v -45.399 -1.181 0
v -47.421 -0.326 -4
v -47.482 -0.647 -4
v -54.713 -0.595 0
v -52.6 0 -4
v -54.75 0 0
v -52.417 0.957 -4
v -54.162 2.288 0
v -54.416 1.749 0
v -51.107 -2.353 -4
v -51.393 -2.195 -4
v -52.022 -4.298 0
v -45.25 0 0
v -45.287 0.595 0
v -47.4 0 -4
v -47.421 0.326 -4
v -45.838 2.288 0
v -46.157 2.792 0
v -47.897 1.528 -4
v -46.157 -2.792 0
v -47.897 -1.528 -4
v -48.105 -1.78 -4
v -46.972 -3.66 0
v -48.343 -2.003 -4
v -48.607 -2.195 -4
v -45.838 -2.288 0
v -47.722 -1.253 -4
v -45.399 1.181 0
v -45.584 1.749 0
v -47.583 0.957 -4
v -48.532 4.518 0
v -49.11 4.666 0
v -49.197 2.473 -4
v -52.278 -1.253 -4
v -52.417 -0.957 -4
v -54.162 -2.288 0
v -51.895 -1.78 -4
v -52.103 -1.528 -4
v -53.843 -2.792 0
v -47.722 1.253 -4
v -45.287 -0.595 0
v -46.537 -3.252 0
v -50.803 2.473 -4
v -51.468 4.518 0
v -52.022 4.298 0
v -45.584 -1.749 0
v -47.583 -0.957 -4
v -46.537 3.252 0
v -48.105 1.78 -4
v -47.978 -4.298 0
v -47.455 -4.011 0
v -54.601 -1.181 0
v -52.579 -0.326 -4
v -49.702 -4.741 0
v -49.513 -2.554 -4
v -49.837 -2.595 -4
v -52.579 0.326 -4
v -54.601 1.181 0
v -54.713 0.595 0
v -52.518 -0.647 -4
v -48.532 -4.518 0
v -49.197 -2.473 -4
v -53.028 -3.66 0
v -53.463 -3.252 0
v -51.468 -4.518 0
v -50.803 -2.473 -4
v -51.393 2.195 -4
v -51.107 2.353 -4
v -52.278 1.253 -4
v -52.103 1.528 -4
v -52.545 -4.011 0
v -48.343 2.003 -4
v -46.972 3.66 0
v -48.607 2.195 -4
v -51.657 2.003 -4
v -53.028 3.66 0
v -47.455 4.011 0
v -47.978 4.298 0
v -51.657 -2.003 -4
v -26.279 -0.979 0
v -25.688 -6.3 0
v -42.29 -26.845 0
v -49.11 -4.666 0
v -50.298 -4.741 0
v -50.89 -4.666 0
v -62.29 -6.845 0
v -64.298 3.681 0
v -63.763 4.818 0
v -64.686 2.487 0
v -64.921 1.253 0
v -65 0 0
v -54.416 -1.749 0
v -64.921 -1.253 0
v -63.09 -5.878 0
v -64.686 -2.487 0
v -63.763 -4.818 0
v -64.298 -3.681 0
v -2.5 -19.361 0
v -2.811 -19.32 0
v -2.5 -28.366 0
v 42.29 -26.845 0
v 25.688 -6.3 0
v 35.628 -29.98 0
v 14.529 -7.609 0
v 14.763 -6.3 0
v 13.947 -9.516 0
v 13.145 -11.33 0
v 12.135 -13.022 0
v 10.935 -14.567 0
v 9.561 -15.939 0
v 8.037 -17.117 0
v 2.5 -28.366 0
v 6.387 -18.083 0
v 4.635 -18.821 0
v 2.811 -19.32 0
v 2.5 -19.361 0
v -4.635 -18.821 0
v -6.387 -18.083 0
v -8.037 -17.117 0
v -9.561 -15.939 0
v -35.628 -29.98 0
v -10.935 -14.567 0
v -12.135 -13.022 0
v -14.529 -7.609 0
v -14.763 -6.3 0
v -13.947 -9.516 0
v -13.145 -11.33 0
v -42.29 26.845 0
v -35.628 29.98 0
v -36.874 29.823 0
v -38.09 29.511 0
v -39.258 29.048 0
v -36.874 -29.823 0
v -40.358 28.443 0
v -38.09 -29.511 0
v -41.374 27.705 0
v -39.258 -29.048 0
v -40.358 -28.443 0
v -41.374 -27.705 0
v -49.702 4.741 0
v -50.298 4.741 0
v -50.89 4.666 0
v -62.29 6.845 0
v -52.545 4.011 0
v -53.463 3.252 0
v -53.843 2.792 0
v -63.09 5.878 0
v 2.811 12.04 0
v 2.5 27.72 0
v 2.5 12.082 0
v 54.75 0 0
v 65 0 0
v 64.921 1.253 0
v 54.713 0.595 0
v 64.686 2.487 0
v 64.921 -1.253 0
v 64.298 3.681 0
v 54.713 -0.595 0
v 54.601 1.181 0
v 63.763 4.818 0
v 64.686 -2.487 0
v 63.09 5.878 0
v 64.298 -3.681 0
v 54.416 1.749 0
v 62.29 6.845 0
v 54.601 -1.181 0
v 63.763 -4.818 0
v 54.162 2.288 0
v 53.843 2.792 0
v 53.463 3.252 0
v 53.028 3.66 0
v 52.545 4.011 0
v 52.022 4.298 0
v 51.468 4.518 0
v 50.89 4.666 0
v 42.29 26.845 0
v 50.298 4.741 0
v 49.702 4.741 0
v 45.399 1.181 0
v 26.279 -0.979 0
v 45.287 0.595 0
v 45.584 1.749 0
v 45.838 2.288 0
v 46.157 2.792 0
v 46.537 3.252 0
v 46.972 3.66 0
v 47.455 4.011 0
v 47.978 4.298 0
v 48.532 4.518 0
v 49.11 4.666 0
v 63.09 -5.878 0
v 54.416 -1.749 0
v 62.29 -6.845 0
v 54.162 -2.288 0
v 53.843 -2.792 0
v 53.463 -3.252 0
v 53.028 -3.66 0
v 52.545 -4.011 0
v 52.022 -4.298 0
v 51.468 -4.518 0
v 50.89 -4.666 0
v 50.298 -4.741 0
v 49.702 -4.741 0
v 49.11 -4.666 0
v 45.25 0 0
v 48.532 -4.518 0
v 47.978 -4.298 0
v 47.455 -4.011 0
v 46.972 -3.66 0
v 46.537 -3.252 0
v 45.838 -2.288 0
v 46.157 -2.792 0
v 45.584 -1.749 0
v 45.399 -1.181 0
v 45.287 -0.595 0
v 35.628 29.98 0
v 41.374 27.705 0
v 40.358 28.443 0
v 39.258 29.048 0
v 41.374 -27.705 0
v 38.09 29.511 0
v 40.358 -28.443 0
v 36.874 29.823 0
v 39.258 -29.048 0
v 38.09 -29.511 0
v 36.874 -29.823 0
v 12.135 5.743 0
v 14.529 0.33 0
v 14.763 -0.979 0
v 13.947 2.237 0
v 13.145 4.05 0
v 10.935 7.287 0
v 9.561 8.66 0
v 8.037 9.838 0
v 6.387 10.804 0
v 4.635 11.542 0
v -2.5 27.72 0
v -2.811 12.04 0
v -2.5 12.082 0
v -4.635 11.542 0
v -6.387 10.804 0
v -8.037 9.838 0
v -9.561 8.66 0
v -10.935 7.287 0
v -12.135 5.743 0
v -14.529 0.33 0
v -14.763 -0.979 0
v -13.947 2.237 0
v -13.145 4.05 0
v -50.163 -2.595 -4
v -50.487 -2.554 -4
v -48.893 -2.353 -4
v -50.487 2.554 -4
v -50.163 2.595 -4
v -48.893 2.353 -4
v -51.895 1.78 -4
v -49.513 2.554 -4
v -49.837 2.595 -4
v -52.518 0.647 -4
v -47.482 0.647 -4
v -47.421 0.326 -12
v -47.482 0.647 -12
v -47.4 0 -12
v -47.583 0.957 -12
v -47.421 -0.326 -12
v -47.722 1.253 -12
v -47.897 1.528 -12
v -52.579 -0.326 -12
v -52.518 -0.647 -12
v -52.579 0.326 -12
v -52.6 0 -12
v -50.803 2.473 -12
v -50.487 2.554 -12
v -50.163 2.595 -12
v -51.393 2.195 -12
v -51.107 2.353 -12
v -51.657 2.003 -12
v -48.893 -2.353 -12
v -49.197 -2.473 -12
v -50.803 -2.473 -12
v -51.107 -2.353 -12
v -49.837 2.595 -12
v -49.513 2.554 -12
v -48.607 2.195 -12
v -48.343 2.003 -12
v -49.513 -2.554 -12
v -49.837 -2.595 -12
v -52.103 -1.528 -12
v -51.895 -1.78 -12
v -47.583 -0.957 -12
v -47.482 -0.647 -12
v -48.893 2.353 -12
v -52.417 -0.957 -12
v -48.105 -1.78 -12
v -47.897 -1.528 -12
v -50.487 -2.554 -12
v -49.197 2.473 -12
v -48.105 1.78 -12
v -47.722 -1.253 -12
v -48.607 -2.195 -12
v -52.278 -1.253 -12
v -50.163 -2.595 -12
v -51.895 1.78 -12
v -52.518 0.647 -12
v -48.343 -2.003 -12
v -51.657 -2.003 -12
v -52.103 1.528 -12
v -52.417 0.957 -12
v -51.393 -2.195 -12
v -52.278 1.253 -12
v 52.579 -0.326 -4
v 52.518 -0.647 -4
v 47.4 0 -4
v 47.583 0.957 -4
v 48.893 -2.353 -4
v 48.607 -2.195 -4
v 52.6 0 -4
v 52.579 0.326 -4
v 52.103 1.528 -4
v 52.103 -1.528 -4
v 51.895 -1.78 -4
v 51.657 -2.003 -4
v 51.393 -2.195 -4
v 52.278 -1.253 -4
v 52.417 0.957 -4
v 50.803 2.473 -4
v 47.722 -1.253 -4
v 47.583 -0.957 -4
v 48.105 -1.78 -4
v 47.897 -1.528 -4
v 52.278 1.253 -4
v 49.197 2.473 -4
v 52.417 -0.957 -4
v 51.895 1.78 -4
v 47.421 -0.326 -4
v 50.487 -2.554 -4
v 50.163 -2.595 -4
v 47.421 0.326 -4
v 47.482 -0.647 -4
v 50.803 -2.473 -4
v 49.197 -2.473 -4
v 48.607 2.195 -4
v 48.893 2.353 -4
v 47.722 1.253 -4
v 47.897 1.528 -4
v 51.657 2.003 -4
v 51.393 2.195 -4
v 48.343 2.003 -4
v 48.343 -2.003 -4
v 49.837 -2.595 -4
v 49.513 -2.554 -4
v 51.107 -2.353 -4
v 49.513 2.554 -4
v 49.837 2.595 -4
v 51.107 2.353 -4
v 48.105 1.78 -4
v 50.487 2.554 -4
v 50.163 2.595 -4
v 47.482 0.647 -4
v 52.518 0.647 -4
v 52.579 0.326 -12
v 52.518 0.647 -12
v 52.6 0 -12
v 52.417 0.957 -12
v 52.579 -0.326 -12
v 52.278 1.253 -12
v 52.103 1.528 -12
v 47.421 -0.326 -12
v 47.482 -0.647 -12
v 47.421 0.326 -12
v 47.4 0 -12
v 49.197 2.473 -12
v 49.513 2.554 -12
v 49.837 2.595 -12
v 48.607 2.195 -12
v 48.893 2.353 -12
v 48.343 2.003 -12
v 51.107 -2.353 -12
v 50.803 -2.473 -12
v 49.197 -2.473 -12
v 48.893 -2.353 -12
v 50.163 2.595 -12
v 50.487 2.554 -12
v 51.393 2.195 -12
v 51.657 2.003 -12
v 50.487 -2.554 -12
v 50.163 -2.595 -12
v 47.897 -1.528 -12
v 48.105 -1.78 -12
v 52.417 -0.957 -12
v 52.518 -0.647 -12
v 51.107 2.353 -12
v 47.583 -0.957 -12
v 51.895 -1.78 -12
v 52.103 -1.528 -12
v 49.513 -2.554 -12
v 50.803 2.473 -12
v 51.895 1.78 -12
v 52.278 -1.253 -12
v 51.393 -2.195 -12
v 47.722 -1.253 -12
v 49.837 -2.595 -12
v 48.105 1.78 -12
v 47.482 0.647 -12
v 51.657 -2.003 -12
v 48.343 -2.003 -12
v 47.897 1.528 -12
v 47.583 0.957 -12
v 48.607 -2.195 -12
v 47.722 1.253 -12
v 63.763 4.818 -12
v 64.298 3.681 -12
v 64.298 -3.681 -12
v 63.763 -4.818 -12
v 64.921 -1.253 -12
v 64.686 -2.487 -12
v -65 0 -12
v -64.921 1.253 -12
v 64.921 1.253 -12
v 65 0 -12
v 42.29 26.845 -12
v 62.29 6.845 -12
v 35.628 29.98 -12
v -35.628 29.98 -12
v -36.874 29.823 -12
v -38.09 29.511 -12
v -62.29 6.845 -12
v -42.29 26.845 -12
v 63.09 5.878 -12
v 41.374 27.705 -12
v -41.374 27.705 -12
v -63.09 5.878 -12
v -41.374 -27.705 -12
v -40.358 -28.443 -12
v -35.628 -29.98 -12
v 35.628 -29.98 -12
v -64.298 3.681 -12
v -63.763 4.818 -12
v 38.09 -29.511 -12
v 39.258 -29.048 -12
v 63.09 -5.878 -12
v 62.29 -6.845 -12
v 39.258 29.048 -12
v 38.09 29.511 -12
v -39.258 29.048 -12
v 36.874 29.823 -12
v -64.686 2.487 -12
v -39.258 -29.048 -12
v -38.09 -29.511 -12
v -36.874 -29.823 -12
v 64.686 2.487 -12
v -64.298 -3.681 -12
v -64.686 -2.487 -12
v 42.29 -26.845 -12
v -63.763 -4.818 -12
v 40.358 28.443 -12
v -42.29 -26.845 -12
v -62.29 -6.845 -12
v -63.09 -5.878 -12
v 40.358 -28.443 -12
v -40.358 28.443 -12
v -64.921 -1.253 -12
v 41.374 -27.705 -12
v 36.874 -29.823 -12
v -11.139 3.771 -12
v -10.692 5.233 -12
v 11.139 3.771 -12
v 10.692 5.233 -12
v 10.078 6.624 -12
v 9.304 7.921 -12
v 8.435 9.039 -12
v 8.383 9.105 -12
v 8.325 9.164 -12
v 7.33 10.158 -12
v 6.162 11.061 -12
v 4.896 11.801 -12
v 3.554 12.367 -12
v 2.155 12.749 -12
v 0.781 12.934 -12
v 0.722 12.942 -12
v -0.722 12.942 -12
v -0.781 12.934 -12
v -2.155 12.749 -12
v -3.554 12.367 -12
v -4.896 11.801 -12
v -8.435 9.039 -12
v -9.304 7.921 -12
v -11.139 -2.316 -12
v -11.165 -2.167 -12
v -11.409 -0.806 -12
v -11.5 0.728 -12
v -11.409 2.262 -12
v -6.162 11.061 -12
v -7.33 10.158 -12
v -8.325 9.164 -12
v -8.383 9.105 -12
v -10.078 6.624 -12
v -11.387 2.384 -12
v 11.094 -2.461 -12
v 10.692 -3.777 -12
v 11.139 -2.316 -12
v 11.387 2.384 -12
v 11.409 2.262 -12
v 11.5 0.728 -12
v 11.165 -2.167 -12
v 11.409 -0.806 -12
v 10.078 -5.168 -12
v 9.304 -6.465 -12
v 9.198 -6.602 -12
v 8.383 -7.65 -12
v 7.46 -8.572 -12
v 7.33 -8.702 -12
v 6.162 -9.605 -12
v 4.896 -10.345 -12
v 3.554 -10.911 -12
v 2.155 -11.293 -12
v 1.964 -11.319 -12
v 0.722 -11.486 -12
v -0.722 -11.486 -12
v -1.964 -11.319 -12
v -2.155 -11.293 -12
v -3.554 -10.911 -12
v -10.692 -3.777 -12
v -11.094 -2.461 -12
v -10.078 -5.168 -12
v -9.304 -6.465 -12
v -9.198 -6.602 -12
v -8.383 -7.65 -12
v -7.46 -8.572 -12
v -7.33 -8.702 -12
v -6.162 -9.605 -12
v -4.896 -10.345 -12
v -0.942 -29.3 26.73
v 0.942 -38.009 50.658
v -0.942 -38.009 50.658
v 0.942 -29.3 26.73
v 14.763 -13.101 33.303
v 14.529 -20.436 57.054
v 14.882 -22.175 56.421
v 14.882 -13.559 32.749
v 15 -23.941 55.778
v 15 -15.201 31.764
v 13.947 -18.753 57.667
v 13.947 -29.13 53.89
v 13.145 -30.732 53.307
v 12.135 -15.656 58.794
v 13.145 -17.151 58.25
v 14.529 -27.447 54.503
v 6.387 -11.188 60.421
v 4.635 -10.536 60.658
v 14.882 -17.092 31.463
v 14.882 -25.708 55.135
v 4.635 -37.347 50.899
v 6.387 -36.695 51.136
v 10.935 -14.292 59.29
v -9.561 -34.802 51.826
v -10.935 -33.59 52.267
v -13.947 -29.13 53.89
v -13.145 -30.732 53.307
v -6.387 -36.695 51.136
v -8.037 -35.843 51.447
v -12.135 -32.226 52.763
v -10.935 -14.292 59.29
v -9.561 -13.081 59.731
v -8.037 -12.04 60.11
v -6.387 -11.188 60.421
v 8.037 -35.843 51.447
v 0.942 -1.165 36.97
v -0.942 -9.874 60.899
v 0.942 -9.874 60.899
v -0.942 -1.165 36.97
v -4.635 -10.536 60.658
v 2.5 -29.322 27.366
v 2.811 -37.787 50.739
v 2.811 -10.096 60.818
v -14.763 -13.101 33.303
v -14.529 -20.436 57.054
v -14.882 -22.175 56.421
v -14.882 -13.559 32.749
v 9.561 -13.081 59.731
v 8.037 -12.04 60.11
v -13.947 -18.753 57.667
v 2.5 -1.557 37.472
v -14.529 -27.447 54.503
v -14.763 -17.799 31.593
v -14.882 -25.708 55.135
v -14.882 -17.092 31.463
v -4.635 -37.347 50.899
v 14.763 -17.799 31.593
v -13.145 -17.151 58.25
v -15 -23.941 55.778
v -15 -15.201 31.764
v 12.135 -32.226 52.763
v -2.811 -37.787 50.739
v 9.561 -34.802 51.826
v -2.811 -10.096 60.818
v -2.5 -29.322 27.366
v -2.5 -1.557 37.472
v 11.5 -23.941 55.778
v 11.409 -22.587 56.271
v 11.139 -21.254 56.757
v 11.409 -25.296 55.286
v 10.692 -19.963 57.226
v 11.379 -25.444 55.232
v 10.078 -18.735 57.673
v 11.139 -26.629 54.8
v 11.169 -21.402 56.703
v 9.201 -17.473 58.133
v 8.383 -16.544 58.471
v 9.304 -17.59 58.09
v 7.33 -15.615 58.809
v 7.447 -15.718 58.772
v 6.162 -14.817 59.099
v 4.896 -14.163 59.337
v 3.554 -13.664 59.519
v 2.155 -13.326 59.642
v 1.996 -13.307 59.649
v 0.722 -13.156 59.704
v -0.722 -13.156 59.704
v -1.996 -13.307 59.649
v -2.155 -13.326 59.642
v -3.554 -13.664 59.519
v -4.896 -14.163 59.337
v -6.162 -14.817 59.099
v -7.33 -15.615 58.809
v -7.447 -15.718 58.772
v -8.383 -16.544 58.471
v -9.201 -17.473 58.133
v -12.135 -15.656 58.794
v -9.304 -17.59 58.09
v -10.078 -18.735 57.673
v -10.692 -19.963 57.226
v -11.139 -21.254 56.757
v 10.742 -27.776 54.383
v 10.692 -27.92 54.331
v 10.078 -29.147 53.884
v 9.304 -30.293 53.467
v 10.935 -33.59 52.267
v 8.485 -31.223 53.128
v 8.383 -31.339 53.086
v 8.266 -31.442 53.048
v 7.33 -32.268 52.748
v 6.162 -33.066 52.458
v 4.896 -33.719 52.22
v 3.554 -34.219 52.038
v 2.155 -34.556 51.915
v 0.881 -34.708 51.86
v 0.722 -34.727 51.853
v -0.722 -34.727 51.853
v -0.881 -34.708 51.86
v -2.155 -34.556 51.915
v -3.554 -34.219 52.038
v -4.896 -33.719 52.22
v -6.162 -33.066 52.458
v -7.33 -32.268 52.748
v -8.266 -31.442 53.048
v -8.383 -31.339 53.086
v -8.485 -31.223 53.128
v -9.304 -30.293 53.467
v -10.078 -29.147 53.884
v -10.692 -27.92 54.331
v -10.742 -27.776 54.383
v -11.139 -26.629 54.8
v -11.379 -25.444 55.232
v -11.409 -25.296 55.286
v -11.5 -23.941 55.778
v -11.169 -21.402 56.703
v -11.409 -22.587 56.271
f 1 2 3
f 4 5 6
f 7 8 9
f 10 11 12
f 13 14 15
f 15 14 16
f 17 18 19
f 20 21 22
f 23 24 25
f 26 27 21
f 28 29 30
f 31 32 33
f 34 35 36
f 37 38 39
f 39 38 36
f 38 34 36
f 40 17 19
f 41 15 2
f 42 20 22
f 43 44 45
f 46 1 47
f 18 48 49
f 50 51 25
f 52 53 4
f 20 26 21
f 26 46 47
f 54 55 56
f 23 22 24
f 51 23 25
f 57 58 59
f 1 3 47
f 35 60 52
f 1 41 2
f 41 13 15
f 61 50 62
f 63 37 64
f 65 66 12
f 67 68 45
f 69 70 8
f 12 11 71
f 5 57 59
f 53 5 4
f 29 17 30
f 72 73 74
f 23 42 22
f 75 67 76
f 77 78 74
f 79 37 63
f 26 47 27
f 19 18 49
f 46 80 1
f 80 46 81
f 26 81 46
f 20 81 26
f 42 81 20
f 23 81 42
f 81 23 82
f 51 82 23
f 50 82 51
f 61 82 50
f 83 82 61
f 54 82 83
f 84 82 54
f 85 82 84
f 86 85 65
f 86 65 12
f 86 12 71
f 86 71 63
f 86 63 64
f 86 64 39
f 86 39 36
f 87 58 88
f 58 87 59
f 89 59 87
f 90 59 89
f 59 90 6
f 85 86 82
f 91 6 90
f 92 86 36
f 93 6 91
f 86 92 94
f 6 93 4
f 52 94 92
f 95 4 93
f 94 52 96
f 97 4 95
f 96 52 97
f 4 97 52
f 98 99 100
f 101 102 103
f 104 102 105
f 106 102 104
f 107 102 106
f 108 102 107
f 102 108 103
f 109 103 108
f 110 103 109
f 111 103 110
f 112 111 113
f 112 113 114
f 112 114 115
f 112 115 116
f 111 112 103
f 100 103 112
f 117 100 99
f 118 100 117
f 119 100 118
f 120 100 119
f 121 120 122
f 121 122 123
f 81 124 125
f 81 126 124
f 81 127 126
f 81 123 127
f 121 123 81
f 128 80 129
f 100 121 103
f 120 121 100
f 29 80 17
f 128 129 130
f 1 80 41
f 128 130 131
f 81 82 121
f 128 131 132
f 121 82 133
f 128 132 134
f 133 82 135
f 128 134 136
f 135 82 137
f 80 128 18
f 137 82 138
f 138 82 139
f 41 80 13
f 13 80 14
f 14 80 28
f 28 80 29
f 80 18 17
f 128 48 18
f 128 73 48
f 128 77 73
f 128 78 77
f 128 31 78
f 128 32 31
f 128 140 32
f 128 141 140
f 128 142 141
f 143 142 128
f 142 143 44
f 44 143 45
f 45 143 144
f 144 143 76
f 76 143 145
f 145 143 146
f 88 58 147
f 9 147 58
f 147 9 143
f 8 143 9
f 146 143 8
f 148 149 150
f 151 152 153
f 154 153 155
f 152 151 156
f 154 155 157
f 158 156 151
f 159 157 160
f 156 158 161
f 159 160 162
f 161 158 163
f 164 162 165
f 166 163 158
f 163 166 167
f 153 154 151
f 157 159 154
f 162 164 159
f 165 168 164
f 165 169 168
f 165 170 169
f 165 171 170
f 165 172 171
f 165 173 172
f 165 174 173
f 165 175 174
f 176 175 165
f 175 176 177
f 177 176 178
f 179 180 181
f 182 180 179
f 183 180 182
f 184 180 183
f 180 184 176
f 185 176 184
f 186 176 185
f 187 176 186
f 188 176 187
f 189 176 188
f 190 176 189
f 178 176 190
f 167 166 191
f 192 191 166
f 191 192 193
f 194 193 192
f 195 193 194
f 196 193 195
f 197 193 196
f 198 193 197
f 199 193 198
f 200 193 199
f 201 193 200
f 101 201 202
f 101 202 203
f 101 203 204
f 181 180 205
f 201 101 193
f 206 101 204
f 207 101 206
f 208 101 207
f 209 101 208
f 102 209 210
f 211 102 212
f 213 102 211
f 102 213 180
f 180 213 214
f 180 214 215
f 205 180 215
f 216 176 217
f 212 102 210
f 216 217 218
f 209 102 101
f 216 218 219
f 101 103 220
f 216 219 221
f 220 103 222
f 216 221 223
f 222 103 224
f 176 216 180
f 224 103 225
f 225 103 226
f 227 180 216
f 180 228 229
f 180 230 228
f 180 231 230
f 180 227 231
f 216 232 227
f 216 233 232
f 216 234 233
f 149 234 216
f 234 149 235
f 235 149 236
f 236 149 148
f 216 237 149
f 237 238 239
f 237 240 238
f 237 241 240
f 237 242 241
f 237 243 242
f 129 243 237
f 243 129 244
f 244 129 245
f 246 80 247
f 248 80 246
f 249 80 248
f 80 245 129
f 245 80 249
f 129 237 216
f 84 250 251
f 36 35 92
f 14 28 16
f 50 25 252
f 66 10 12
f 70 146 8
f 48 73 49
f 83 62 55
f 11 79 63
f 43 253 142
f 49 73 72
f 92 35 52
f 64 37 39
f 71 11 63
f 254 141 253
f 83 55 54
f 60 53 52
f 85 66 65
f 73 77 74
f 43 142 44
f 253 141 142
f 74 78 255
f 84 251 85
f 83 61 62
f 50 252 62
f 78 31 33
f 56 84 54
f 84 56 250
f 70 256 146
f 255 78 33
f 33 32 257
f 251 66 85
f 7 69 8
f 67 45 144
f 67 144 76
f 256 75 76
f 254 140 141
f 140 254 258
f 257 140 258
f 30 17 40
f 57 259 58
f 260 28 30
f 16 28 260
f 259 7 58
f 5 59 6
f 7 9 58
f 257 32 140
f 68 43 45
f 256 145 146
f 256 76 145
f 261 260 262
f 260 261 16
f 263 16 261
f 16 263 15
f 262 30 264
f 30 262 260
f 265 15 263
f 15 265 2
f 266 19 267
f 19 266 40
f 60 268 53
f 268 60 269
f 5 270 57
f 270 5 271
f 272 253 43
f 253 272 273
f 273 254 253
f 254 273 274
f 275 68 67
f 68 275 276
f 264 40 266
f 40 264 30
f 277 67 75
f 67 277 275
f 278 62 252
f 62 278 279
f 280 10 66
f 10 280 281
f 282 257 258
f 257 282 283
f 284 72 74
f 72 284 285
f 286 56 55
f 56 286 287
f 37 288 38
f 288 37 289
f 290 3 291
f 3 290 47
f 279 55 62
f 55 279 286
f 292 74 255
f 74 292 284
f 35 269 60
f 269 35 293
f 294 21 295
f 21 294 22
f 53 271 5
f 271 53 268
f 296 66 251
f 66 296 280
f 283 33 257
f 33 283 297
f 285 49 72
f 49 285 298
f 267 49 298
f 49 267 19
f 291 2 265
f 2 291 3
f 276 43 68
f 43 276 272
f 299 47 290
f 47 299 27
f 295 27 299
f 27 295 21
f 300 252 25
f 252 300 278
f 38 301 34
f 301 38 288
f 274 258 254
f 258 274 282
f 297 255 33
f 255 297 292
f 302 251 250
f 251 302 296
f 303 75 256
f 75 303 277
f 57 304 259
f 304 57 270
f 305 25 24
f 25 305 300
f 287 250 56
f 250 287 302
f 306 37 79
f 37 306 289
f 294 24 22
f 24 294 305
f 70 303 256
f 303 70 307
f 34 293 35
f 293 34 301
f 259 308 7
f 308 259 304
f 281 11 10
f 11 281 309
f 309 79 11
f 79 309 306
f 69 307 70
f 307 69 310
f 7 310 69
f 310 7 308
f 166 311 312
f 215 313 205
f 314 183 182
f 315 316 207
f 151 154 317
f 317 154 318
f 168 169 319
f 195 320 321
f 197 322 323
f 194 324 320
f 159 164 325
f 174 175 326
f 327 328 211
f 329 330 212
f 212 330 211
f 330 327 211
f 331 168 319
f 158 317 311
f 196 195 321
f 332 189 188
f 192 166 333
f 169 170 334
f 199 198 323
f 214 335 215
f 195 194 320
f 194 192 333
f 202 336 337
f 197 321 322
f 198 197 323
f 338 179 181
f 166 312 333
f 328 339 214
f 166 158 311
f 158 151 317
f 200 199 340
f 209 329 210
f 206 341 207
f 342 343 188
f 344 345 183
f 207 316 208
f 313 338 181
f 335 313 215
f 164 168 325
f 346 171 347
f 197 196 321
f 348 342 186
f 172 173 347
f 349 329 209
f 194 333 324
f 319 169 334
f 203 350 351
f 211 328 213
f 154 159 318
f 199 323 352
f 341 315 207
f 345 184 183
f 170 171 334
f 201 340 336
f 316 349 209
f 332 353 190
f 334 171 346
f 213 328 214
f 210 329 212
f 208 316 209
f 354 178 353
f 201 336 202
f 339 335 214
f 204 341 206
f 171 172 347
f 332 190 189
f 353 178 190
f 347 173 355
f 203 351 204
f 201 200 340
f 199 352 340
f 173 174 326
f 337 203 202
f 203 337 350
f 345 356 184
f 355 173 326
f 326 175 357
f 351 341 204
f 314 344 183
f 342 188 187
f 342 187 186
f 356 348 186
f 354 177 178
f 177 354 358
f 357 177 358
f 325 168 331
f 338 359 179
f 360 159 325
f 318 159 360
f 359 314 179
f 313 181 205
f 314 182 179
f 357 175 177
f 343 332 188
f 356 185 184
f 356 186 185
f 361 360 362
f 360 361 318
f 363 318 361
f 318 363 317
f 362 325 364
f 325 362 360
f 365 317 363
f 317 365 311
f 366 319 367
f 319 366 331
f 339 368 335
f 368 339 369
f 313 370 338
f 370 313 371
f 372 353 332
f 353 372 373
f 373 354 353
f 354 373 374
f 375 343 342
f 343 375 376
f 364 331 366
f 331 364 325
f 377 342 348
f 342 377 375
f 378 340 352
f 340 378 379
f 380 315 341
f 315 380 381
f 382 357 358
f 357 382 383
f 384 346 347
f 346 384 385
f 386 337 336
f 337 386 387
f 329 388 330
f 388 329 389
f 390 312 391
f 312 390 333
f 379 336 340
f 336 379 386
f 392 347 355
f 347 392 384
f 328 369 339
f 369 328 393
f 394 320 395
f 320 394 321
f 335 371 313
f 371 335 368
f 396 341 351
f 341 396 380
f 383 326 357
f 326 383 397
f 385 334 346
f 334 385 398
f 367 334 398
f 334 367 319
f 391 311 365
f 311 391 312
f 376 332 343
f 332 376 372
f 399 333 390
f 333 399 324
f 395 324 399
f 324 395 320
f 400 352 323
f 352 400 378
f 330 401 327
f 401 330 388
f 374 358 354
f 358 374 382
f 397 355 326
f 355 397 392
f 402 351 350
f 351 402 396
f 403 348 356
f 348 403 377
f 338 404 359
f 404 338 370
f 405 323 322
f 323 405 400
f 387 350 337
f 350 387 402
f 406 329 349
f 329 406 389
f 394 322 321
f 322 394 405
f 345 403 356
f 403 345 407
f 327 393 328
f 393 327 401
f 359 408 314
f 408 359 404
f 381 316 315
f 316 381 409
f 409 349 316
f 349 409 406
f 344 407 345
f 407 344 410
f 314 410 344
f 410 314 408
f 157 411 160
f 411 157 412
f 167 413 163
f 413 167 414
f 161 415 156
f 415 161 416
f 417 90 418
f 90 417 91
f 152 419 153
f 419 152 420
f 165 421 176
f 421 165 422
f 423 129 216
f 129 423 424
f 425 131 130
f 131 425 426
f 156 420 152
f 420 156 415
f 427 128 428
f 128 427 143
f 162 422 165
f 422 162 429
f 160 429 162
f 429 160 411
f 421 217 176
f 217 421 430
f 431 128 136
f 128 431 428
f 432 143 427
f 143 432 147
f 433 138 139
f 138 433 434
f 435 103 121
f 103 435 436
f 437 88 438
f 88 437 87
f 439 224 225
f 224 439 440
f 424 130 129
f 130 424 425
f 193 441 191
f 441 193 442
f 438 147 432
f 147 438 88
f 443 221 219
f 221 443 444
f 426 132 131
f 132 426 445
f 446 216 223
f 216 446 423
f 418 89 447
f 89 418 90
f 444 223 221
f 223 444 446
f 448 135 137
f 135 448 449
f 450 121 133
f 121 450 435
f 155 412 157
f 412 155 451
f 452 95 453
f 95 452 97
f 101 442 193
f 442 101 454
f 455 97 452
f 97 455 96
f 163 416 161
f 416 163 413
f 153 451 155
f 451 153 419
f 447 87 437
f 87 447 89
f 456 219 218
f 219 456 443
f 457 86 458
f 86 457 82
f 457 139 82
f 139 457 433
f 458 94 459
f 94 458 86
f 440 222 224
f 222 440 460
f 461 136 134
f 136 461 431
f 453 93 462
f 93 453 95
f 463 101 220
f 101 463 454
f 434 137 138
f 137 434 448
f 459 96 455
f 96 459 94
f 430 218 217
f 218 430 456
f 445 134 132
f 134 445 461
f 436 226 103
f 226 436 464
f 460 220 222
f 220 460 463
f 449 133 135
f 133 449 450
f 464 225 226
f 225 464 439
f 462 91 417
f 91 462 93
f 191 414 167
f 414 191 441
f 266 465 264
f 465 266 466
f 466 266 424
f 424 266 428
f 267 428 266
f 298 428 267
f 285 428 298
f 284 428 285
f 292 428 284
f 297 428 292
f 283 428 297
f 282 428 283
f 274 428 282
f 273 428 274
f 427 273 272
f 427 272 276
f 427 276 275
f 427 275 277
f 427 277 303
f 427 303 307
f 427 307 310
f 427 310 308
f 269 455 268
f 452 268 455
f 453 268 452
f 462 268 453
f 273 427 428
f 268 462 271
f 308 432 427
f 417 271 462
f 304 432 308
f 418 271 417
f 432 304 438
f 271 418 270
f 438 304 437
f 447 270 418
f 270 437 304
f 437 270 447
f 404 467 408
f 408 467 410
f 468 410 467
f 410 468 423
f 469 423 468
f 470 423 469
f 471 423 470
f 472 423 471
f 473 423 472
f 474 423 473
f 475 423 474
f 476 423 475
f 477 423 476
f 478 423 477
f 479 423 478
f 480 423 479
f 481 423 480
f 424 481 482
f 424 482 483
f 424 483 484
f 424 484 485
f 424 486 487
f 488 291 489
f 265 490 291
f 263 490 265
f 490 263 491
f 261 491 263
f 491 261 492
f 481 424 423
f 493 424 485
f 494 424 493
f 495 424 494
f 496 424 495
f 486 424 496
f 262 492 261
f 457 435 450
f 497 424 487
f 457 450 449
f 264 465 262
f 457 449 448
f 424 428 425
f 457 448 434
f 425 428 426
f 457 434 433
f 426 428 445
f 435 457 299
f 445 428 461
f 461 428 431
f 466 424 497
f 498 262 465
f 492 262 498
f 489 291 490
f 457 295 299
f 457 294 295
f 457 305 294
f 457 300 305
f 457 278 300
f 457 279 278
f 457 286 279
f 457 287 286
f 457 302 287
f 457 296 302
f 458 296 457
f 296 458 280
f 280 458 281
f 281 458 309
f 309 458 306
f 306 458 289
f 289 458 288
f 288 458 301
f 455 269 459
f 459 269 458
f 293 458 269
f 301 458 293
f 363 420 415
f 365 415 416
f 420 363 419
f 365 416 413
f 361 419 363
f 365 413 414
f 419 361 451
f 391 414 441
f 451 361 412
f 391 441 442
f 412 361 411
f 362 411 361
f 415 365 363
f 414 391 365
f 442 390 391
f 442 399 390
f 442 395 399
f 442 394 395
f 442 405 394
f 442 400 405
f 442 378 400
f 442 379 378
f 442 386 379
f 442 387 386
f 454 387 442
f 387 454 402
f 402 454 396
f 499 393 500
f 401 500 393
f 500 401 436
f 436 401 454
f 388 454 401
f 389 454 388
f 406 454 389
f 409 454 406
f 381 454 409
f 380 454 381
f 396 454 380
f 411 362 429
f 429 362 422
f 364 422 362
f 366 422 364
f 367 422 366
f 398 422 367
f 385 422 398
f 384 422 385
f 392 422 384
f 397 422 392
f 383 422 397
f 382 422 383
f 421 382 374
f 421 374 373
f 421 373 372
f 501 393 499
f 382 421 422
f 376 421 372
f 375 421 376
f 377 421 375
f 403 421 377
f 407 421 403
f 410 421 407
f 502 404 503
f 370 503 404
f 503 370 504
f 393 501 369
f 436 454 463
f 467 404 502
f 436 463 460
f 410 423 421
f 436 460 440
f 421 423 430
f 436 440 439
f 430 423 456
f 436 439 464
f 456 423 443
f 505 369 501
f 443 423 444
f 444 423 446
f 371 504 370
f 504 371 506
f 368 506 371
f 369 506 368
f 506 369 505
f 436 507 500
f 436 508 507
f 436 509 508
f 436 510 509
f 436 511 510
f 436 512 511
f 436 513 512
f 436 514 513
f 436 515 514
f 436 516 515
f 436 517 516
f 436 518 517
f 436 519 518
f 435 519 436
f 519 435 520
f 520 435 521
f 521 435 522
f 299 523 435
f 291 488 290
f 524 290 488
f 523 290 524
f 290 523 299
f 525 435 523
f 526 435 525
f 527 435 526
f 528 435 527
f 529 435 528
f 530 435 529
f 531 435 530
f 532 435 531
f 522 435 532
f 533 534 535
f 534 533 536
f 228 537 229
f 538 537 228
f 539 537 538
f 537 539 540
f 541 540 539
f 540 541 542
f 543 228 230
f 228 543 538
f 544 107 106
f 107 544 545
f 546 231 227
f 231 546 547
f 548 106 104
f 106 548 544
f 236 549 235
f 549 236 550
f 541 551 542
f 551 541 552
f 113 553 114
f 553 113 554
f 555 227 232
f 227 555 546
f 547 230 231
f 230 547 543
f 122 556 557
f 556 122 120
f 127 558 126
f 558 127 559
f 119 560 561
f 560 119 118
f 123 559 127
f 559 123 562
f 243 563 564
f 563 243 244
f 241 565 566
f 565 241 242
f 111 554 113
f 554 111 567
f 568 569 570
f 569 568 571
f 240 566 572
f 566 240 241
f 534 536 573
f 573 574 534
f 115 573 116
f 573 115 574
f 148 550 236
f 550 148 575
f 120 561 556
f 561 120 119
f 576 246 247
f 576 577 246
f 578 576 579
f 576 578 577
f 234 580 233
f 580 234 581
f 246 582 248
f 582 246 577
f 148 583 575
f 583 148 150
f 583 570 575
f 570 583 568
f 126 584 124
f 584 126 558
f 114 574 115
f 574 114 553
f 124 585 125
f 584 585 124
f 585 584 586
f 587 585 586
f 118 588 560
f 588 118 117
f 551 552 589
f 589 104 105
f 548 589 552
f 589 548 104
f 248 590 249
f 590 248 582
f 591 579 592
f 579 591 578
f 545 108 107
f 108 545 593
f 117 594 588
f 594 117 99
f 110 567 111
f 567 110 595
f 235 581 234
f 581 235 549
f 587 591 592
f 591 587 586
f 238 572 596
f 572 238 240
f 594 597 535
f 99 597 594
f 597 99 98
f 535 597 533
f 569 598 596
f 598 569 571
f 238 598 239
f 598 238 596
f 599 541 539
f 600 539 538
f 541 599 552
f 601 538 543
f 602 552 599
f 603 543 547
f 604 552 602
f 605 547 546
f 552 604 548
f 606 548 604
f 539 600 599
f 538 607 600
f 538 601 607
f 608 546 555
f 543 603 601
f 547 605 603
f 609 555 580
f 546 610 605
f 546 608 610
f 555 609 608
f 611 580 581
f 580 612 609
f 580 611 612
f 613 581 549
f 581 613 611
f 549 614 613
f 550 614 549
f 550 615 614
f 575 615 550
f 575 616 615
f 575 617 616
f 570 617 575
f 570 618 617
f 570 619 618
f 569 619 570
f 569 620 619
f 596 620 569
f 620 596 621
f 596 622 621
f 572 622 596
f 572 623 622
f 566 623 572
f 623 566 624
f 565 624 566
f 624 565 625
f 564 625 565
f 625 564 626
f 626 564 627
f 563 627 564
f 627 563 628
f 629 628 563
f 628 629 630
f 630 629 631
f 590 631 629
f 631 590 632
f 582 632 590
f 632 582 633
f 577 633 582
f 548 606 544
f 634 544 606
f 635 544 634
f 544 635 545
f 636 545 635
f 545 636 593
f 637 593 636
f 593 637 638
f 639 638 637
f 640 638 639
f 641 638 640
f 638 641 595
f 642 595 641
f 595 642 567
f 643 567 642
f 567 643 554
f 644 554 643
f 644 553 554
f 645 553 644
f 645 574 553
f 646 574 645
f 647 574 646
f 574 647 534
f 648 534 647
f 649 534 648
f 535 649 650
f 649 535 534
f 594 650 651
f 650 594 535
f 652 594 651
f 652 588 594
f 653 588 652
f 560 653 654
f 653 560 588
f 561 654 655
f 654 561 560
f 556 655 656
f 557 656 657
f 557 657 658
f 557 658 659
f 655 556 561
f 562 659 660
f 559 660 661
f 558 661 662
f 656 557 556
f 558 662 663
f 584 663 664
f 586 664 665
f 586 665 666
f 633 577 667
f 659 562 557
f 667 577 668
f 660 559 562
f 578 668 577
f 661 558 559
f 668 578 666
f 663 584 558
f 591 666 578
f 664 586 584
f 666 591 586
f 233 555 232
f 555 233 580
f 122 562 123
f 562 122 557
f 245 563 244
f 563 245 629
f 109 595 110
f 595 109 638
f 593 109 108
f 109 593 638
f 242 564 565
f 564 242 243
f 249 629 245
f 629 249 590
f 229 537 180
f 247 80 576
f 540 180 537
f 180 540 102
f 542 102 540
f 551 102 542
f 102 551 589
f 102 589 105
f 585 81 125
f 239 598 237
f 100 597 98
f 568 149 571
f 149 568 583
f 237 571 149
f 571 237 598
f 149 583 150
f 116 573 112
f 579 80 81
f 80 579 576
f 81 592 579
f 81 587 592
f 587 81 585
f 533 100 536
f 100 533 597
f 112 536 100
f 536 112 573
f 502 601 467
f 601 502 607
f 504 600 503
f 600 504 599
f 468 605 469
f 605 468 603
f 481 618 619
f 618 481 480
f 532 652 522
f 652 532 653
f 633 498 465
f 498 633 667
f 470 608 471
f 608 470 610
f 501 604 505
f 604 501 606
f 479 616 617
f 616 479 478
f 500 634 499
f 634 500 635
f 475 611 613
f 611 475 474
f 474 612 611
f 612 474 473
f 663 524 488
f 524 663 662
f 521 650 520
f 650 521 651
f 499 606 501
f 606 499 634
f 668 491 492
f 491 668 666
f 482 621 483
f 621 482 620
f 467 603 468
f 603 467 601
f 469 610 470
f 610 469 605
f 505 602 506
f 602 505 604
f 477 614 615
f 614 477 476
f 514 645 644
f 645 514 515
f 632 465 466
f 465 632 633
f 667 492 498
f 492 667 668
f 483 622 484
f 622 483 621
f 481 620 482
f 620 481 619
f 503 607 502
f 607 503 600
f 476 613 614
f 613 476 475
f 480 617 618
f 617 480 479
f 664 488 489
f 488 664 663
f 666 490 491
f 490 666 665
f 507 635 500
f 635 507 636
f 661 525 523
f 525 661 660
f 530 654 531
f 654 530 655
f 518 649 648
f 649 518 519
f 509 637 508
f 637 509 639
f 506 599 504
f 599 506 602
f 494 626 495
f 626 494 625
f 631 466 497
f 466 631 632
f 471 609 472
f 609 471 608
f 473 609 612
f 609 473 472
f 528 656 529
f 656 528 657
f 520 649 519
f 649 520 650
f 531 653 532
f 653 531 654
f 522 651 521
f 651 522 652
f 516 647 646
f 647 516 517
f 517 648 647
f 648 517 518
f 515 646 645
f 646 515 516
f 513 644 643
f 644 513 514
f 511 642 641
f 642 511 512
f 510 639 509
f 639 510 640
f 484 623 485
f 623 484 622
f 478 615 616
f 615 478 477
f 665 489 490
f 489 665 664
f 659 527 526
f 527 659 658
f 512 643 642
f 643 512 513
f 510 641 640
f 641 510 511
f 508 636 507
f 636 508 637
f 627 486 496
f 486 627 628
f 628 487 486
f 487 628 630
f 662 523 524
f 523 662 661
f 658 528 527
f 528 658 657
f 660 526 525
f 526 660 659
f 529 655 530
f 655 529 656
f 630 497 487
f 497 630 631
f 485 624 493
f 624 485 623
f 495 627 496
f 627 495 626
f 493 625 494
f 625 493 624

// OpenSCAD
// file: bracket-common.scad
module plate3d(height){
    translate([0,0,-height]){
        linear_extrude(height = height, center = false, convexity = 10, twist = 0){
            plate2d();
        }
    }
}

module plate2d(){
    cornerX = 35;
    cornerY = 20;
    tipX = 55;
    tipY = 0;

    hull(){
        corner(-tipX,tipY);
        corner(-cornerX,cornerY);
        corner(-cornerX,-cornerY);
        corner(cornerX,cornerY);
        corner(cornerX,-cornerY);
        corner(tipX,tipY);
    }
}

module corner(x,y){
    translate([x,y,0]){
        circle(r=10);
    }
}
// main file
include <bracket-common.scad>;

$fn=50;

topPlateWithHandleHolder();

module topPlateWithHandleHolder(){
    difference(){
        union(){
            topPlate();
            translate([0,0,-10]){ //workaround to make make it work short-term
                rotatedHandleHolder();
            }
        }
        translate([0,0,-10]){ //workaround to make make it work short-term
            handleHole();
        }
    }
}

module rotatedHandleHolder(){
    intersection(){
        rotate([20,0,0]){
            handleHolder();
        }
        translate([0,-5,50]){
            cube([100,70,80], center=true);
        }
    }
}

module handleHole(){
    radius = 23 / 2;
    rotate([20,0,0]){
        translate([0,0,-10]){
            cylinder(90,radius,radius);
        }
    }
}

module handleHolder(){
    translate([0,0,-10]){
        cylinder(80,15,15);
    }
    fin(0);
    fin(90);
    fin(180);
    fin(270);
}

module fin(zRotation){
    rotate([0,-18,zRotation]){
        translate([18,0,15]){
            cube([20,5,80], center=true);
        }
    }
}


module topPlate(){
    plateHeight = 12;
    holeX = 50;
    holeY = 0;
    difference(){
        plate3d(plateHeight);
        translate([-holeX, holeY, 0]){
            m5countersinkScrew();
        }
        translate([holeX, holeY, 0]){
            m5countersinkScrew();
        }
    }
}

module m5countersinkScrew(){
    holeRadius = 5.2 / 2;
    holeHeigth = 50;
    headRadius = 9.5 / 2;
    headHeight = 4;
    translate([0, 0, -headHeight]){
        cylinder(headHeight, holeRadius, headRadius);
    }
    translate([0,0,-53]){
        cylinder(holeHeigth, holeRadius, holeRadius);
    }
}
